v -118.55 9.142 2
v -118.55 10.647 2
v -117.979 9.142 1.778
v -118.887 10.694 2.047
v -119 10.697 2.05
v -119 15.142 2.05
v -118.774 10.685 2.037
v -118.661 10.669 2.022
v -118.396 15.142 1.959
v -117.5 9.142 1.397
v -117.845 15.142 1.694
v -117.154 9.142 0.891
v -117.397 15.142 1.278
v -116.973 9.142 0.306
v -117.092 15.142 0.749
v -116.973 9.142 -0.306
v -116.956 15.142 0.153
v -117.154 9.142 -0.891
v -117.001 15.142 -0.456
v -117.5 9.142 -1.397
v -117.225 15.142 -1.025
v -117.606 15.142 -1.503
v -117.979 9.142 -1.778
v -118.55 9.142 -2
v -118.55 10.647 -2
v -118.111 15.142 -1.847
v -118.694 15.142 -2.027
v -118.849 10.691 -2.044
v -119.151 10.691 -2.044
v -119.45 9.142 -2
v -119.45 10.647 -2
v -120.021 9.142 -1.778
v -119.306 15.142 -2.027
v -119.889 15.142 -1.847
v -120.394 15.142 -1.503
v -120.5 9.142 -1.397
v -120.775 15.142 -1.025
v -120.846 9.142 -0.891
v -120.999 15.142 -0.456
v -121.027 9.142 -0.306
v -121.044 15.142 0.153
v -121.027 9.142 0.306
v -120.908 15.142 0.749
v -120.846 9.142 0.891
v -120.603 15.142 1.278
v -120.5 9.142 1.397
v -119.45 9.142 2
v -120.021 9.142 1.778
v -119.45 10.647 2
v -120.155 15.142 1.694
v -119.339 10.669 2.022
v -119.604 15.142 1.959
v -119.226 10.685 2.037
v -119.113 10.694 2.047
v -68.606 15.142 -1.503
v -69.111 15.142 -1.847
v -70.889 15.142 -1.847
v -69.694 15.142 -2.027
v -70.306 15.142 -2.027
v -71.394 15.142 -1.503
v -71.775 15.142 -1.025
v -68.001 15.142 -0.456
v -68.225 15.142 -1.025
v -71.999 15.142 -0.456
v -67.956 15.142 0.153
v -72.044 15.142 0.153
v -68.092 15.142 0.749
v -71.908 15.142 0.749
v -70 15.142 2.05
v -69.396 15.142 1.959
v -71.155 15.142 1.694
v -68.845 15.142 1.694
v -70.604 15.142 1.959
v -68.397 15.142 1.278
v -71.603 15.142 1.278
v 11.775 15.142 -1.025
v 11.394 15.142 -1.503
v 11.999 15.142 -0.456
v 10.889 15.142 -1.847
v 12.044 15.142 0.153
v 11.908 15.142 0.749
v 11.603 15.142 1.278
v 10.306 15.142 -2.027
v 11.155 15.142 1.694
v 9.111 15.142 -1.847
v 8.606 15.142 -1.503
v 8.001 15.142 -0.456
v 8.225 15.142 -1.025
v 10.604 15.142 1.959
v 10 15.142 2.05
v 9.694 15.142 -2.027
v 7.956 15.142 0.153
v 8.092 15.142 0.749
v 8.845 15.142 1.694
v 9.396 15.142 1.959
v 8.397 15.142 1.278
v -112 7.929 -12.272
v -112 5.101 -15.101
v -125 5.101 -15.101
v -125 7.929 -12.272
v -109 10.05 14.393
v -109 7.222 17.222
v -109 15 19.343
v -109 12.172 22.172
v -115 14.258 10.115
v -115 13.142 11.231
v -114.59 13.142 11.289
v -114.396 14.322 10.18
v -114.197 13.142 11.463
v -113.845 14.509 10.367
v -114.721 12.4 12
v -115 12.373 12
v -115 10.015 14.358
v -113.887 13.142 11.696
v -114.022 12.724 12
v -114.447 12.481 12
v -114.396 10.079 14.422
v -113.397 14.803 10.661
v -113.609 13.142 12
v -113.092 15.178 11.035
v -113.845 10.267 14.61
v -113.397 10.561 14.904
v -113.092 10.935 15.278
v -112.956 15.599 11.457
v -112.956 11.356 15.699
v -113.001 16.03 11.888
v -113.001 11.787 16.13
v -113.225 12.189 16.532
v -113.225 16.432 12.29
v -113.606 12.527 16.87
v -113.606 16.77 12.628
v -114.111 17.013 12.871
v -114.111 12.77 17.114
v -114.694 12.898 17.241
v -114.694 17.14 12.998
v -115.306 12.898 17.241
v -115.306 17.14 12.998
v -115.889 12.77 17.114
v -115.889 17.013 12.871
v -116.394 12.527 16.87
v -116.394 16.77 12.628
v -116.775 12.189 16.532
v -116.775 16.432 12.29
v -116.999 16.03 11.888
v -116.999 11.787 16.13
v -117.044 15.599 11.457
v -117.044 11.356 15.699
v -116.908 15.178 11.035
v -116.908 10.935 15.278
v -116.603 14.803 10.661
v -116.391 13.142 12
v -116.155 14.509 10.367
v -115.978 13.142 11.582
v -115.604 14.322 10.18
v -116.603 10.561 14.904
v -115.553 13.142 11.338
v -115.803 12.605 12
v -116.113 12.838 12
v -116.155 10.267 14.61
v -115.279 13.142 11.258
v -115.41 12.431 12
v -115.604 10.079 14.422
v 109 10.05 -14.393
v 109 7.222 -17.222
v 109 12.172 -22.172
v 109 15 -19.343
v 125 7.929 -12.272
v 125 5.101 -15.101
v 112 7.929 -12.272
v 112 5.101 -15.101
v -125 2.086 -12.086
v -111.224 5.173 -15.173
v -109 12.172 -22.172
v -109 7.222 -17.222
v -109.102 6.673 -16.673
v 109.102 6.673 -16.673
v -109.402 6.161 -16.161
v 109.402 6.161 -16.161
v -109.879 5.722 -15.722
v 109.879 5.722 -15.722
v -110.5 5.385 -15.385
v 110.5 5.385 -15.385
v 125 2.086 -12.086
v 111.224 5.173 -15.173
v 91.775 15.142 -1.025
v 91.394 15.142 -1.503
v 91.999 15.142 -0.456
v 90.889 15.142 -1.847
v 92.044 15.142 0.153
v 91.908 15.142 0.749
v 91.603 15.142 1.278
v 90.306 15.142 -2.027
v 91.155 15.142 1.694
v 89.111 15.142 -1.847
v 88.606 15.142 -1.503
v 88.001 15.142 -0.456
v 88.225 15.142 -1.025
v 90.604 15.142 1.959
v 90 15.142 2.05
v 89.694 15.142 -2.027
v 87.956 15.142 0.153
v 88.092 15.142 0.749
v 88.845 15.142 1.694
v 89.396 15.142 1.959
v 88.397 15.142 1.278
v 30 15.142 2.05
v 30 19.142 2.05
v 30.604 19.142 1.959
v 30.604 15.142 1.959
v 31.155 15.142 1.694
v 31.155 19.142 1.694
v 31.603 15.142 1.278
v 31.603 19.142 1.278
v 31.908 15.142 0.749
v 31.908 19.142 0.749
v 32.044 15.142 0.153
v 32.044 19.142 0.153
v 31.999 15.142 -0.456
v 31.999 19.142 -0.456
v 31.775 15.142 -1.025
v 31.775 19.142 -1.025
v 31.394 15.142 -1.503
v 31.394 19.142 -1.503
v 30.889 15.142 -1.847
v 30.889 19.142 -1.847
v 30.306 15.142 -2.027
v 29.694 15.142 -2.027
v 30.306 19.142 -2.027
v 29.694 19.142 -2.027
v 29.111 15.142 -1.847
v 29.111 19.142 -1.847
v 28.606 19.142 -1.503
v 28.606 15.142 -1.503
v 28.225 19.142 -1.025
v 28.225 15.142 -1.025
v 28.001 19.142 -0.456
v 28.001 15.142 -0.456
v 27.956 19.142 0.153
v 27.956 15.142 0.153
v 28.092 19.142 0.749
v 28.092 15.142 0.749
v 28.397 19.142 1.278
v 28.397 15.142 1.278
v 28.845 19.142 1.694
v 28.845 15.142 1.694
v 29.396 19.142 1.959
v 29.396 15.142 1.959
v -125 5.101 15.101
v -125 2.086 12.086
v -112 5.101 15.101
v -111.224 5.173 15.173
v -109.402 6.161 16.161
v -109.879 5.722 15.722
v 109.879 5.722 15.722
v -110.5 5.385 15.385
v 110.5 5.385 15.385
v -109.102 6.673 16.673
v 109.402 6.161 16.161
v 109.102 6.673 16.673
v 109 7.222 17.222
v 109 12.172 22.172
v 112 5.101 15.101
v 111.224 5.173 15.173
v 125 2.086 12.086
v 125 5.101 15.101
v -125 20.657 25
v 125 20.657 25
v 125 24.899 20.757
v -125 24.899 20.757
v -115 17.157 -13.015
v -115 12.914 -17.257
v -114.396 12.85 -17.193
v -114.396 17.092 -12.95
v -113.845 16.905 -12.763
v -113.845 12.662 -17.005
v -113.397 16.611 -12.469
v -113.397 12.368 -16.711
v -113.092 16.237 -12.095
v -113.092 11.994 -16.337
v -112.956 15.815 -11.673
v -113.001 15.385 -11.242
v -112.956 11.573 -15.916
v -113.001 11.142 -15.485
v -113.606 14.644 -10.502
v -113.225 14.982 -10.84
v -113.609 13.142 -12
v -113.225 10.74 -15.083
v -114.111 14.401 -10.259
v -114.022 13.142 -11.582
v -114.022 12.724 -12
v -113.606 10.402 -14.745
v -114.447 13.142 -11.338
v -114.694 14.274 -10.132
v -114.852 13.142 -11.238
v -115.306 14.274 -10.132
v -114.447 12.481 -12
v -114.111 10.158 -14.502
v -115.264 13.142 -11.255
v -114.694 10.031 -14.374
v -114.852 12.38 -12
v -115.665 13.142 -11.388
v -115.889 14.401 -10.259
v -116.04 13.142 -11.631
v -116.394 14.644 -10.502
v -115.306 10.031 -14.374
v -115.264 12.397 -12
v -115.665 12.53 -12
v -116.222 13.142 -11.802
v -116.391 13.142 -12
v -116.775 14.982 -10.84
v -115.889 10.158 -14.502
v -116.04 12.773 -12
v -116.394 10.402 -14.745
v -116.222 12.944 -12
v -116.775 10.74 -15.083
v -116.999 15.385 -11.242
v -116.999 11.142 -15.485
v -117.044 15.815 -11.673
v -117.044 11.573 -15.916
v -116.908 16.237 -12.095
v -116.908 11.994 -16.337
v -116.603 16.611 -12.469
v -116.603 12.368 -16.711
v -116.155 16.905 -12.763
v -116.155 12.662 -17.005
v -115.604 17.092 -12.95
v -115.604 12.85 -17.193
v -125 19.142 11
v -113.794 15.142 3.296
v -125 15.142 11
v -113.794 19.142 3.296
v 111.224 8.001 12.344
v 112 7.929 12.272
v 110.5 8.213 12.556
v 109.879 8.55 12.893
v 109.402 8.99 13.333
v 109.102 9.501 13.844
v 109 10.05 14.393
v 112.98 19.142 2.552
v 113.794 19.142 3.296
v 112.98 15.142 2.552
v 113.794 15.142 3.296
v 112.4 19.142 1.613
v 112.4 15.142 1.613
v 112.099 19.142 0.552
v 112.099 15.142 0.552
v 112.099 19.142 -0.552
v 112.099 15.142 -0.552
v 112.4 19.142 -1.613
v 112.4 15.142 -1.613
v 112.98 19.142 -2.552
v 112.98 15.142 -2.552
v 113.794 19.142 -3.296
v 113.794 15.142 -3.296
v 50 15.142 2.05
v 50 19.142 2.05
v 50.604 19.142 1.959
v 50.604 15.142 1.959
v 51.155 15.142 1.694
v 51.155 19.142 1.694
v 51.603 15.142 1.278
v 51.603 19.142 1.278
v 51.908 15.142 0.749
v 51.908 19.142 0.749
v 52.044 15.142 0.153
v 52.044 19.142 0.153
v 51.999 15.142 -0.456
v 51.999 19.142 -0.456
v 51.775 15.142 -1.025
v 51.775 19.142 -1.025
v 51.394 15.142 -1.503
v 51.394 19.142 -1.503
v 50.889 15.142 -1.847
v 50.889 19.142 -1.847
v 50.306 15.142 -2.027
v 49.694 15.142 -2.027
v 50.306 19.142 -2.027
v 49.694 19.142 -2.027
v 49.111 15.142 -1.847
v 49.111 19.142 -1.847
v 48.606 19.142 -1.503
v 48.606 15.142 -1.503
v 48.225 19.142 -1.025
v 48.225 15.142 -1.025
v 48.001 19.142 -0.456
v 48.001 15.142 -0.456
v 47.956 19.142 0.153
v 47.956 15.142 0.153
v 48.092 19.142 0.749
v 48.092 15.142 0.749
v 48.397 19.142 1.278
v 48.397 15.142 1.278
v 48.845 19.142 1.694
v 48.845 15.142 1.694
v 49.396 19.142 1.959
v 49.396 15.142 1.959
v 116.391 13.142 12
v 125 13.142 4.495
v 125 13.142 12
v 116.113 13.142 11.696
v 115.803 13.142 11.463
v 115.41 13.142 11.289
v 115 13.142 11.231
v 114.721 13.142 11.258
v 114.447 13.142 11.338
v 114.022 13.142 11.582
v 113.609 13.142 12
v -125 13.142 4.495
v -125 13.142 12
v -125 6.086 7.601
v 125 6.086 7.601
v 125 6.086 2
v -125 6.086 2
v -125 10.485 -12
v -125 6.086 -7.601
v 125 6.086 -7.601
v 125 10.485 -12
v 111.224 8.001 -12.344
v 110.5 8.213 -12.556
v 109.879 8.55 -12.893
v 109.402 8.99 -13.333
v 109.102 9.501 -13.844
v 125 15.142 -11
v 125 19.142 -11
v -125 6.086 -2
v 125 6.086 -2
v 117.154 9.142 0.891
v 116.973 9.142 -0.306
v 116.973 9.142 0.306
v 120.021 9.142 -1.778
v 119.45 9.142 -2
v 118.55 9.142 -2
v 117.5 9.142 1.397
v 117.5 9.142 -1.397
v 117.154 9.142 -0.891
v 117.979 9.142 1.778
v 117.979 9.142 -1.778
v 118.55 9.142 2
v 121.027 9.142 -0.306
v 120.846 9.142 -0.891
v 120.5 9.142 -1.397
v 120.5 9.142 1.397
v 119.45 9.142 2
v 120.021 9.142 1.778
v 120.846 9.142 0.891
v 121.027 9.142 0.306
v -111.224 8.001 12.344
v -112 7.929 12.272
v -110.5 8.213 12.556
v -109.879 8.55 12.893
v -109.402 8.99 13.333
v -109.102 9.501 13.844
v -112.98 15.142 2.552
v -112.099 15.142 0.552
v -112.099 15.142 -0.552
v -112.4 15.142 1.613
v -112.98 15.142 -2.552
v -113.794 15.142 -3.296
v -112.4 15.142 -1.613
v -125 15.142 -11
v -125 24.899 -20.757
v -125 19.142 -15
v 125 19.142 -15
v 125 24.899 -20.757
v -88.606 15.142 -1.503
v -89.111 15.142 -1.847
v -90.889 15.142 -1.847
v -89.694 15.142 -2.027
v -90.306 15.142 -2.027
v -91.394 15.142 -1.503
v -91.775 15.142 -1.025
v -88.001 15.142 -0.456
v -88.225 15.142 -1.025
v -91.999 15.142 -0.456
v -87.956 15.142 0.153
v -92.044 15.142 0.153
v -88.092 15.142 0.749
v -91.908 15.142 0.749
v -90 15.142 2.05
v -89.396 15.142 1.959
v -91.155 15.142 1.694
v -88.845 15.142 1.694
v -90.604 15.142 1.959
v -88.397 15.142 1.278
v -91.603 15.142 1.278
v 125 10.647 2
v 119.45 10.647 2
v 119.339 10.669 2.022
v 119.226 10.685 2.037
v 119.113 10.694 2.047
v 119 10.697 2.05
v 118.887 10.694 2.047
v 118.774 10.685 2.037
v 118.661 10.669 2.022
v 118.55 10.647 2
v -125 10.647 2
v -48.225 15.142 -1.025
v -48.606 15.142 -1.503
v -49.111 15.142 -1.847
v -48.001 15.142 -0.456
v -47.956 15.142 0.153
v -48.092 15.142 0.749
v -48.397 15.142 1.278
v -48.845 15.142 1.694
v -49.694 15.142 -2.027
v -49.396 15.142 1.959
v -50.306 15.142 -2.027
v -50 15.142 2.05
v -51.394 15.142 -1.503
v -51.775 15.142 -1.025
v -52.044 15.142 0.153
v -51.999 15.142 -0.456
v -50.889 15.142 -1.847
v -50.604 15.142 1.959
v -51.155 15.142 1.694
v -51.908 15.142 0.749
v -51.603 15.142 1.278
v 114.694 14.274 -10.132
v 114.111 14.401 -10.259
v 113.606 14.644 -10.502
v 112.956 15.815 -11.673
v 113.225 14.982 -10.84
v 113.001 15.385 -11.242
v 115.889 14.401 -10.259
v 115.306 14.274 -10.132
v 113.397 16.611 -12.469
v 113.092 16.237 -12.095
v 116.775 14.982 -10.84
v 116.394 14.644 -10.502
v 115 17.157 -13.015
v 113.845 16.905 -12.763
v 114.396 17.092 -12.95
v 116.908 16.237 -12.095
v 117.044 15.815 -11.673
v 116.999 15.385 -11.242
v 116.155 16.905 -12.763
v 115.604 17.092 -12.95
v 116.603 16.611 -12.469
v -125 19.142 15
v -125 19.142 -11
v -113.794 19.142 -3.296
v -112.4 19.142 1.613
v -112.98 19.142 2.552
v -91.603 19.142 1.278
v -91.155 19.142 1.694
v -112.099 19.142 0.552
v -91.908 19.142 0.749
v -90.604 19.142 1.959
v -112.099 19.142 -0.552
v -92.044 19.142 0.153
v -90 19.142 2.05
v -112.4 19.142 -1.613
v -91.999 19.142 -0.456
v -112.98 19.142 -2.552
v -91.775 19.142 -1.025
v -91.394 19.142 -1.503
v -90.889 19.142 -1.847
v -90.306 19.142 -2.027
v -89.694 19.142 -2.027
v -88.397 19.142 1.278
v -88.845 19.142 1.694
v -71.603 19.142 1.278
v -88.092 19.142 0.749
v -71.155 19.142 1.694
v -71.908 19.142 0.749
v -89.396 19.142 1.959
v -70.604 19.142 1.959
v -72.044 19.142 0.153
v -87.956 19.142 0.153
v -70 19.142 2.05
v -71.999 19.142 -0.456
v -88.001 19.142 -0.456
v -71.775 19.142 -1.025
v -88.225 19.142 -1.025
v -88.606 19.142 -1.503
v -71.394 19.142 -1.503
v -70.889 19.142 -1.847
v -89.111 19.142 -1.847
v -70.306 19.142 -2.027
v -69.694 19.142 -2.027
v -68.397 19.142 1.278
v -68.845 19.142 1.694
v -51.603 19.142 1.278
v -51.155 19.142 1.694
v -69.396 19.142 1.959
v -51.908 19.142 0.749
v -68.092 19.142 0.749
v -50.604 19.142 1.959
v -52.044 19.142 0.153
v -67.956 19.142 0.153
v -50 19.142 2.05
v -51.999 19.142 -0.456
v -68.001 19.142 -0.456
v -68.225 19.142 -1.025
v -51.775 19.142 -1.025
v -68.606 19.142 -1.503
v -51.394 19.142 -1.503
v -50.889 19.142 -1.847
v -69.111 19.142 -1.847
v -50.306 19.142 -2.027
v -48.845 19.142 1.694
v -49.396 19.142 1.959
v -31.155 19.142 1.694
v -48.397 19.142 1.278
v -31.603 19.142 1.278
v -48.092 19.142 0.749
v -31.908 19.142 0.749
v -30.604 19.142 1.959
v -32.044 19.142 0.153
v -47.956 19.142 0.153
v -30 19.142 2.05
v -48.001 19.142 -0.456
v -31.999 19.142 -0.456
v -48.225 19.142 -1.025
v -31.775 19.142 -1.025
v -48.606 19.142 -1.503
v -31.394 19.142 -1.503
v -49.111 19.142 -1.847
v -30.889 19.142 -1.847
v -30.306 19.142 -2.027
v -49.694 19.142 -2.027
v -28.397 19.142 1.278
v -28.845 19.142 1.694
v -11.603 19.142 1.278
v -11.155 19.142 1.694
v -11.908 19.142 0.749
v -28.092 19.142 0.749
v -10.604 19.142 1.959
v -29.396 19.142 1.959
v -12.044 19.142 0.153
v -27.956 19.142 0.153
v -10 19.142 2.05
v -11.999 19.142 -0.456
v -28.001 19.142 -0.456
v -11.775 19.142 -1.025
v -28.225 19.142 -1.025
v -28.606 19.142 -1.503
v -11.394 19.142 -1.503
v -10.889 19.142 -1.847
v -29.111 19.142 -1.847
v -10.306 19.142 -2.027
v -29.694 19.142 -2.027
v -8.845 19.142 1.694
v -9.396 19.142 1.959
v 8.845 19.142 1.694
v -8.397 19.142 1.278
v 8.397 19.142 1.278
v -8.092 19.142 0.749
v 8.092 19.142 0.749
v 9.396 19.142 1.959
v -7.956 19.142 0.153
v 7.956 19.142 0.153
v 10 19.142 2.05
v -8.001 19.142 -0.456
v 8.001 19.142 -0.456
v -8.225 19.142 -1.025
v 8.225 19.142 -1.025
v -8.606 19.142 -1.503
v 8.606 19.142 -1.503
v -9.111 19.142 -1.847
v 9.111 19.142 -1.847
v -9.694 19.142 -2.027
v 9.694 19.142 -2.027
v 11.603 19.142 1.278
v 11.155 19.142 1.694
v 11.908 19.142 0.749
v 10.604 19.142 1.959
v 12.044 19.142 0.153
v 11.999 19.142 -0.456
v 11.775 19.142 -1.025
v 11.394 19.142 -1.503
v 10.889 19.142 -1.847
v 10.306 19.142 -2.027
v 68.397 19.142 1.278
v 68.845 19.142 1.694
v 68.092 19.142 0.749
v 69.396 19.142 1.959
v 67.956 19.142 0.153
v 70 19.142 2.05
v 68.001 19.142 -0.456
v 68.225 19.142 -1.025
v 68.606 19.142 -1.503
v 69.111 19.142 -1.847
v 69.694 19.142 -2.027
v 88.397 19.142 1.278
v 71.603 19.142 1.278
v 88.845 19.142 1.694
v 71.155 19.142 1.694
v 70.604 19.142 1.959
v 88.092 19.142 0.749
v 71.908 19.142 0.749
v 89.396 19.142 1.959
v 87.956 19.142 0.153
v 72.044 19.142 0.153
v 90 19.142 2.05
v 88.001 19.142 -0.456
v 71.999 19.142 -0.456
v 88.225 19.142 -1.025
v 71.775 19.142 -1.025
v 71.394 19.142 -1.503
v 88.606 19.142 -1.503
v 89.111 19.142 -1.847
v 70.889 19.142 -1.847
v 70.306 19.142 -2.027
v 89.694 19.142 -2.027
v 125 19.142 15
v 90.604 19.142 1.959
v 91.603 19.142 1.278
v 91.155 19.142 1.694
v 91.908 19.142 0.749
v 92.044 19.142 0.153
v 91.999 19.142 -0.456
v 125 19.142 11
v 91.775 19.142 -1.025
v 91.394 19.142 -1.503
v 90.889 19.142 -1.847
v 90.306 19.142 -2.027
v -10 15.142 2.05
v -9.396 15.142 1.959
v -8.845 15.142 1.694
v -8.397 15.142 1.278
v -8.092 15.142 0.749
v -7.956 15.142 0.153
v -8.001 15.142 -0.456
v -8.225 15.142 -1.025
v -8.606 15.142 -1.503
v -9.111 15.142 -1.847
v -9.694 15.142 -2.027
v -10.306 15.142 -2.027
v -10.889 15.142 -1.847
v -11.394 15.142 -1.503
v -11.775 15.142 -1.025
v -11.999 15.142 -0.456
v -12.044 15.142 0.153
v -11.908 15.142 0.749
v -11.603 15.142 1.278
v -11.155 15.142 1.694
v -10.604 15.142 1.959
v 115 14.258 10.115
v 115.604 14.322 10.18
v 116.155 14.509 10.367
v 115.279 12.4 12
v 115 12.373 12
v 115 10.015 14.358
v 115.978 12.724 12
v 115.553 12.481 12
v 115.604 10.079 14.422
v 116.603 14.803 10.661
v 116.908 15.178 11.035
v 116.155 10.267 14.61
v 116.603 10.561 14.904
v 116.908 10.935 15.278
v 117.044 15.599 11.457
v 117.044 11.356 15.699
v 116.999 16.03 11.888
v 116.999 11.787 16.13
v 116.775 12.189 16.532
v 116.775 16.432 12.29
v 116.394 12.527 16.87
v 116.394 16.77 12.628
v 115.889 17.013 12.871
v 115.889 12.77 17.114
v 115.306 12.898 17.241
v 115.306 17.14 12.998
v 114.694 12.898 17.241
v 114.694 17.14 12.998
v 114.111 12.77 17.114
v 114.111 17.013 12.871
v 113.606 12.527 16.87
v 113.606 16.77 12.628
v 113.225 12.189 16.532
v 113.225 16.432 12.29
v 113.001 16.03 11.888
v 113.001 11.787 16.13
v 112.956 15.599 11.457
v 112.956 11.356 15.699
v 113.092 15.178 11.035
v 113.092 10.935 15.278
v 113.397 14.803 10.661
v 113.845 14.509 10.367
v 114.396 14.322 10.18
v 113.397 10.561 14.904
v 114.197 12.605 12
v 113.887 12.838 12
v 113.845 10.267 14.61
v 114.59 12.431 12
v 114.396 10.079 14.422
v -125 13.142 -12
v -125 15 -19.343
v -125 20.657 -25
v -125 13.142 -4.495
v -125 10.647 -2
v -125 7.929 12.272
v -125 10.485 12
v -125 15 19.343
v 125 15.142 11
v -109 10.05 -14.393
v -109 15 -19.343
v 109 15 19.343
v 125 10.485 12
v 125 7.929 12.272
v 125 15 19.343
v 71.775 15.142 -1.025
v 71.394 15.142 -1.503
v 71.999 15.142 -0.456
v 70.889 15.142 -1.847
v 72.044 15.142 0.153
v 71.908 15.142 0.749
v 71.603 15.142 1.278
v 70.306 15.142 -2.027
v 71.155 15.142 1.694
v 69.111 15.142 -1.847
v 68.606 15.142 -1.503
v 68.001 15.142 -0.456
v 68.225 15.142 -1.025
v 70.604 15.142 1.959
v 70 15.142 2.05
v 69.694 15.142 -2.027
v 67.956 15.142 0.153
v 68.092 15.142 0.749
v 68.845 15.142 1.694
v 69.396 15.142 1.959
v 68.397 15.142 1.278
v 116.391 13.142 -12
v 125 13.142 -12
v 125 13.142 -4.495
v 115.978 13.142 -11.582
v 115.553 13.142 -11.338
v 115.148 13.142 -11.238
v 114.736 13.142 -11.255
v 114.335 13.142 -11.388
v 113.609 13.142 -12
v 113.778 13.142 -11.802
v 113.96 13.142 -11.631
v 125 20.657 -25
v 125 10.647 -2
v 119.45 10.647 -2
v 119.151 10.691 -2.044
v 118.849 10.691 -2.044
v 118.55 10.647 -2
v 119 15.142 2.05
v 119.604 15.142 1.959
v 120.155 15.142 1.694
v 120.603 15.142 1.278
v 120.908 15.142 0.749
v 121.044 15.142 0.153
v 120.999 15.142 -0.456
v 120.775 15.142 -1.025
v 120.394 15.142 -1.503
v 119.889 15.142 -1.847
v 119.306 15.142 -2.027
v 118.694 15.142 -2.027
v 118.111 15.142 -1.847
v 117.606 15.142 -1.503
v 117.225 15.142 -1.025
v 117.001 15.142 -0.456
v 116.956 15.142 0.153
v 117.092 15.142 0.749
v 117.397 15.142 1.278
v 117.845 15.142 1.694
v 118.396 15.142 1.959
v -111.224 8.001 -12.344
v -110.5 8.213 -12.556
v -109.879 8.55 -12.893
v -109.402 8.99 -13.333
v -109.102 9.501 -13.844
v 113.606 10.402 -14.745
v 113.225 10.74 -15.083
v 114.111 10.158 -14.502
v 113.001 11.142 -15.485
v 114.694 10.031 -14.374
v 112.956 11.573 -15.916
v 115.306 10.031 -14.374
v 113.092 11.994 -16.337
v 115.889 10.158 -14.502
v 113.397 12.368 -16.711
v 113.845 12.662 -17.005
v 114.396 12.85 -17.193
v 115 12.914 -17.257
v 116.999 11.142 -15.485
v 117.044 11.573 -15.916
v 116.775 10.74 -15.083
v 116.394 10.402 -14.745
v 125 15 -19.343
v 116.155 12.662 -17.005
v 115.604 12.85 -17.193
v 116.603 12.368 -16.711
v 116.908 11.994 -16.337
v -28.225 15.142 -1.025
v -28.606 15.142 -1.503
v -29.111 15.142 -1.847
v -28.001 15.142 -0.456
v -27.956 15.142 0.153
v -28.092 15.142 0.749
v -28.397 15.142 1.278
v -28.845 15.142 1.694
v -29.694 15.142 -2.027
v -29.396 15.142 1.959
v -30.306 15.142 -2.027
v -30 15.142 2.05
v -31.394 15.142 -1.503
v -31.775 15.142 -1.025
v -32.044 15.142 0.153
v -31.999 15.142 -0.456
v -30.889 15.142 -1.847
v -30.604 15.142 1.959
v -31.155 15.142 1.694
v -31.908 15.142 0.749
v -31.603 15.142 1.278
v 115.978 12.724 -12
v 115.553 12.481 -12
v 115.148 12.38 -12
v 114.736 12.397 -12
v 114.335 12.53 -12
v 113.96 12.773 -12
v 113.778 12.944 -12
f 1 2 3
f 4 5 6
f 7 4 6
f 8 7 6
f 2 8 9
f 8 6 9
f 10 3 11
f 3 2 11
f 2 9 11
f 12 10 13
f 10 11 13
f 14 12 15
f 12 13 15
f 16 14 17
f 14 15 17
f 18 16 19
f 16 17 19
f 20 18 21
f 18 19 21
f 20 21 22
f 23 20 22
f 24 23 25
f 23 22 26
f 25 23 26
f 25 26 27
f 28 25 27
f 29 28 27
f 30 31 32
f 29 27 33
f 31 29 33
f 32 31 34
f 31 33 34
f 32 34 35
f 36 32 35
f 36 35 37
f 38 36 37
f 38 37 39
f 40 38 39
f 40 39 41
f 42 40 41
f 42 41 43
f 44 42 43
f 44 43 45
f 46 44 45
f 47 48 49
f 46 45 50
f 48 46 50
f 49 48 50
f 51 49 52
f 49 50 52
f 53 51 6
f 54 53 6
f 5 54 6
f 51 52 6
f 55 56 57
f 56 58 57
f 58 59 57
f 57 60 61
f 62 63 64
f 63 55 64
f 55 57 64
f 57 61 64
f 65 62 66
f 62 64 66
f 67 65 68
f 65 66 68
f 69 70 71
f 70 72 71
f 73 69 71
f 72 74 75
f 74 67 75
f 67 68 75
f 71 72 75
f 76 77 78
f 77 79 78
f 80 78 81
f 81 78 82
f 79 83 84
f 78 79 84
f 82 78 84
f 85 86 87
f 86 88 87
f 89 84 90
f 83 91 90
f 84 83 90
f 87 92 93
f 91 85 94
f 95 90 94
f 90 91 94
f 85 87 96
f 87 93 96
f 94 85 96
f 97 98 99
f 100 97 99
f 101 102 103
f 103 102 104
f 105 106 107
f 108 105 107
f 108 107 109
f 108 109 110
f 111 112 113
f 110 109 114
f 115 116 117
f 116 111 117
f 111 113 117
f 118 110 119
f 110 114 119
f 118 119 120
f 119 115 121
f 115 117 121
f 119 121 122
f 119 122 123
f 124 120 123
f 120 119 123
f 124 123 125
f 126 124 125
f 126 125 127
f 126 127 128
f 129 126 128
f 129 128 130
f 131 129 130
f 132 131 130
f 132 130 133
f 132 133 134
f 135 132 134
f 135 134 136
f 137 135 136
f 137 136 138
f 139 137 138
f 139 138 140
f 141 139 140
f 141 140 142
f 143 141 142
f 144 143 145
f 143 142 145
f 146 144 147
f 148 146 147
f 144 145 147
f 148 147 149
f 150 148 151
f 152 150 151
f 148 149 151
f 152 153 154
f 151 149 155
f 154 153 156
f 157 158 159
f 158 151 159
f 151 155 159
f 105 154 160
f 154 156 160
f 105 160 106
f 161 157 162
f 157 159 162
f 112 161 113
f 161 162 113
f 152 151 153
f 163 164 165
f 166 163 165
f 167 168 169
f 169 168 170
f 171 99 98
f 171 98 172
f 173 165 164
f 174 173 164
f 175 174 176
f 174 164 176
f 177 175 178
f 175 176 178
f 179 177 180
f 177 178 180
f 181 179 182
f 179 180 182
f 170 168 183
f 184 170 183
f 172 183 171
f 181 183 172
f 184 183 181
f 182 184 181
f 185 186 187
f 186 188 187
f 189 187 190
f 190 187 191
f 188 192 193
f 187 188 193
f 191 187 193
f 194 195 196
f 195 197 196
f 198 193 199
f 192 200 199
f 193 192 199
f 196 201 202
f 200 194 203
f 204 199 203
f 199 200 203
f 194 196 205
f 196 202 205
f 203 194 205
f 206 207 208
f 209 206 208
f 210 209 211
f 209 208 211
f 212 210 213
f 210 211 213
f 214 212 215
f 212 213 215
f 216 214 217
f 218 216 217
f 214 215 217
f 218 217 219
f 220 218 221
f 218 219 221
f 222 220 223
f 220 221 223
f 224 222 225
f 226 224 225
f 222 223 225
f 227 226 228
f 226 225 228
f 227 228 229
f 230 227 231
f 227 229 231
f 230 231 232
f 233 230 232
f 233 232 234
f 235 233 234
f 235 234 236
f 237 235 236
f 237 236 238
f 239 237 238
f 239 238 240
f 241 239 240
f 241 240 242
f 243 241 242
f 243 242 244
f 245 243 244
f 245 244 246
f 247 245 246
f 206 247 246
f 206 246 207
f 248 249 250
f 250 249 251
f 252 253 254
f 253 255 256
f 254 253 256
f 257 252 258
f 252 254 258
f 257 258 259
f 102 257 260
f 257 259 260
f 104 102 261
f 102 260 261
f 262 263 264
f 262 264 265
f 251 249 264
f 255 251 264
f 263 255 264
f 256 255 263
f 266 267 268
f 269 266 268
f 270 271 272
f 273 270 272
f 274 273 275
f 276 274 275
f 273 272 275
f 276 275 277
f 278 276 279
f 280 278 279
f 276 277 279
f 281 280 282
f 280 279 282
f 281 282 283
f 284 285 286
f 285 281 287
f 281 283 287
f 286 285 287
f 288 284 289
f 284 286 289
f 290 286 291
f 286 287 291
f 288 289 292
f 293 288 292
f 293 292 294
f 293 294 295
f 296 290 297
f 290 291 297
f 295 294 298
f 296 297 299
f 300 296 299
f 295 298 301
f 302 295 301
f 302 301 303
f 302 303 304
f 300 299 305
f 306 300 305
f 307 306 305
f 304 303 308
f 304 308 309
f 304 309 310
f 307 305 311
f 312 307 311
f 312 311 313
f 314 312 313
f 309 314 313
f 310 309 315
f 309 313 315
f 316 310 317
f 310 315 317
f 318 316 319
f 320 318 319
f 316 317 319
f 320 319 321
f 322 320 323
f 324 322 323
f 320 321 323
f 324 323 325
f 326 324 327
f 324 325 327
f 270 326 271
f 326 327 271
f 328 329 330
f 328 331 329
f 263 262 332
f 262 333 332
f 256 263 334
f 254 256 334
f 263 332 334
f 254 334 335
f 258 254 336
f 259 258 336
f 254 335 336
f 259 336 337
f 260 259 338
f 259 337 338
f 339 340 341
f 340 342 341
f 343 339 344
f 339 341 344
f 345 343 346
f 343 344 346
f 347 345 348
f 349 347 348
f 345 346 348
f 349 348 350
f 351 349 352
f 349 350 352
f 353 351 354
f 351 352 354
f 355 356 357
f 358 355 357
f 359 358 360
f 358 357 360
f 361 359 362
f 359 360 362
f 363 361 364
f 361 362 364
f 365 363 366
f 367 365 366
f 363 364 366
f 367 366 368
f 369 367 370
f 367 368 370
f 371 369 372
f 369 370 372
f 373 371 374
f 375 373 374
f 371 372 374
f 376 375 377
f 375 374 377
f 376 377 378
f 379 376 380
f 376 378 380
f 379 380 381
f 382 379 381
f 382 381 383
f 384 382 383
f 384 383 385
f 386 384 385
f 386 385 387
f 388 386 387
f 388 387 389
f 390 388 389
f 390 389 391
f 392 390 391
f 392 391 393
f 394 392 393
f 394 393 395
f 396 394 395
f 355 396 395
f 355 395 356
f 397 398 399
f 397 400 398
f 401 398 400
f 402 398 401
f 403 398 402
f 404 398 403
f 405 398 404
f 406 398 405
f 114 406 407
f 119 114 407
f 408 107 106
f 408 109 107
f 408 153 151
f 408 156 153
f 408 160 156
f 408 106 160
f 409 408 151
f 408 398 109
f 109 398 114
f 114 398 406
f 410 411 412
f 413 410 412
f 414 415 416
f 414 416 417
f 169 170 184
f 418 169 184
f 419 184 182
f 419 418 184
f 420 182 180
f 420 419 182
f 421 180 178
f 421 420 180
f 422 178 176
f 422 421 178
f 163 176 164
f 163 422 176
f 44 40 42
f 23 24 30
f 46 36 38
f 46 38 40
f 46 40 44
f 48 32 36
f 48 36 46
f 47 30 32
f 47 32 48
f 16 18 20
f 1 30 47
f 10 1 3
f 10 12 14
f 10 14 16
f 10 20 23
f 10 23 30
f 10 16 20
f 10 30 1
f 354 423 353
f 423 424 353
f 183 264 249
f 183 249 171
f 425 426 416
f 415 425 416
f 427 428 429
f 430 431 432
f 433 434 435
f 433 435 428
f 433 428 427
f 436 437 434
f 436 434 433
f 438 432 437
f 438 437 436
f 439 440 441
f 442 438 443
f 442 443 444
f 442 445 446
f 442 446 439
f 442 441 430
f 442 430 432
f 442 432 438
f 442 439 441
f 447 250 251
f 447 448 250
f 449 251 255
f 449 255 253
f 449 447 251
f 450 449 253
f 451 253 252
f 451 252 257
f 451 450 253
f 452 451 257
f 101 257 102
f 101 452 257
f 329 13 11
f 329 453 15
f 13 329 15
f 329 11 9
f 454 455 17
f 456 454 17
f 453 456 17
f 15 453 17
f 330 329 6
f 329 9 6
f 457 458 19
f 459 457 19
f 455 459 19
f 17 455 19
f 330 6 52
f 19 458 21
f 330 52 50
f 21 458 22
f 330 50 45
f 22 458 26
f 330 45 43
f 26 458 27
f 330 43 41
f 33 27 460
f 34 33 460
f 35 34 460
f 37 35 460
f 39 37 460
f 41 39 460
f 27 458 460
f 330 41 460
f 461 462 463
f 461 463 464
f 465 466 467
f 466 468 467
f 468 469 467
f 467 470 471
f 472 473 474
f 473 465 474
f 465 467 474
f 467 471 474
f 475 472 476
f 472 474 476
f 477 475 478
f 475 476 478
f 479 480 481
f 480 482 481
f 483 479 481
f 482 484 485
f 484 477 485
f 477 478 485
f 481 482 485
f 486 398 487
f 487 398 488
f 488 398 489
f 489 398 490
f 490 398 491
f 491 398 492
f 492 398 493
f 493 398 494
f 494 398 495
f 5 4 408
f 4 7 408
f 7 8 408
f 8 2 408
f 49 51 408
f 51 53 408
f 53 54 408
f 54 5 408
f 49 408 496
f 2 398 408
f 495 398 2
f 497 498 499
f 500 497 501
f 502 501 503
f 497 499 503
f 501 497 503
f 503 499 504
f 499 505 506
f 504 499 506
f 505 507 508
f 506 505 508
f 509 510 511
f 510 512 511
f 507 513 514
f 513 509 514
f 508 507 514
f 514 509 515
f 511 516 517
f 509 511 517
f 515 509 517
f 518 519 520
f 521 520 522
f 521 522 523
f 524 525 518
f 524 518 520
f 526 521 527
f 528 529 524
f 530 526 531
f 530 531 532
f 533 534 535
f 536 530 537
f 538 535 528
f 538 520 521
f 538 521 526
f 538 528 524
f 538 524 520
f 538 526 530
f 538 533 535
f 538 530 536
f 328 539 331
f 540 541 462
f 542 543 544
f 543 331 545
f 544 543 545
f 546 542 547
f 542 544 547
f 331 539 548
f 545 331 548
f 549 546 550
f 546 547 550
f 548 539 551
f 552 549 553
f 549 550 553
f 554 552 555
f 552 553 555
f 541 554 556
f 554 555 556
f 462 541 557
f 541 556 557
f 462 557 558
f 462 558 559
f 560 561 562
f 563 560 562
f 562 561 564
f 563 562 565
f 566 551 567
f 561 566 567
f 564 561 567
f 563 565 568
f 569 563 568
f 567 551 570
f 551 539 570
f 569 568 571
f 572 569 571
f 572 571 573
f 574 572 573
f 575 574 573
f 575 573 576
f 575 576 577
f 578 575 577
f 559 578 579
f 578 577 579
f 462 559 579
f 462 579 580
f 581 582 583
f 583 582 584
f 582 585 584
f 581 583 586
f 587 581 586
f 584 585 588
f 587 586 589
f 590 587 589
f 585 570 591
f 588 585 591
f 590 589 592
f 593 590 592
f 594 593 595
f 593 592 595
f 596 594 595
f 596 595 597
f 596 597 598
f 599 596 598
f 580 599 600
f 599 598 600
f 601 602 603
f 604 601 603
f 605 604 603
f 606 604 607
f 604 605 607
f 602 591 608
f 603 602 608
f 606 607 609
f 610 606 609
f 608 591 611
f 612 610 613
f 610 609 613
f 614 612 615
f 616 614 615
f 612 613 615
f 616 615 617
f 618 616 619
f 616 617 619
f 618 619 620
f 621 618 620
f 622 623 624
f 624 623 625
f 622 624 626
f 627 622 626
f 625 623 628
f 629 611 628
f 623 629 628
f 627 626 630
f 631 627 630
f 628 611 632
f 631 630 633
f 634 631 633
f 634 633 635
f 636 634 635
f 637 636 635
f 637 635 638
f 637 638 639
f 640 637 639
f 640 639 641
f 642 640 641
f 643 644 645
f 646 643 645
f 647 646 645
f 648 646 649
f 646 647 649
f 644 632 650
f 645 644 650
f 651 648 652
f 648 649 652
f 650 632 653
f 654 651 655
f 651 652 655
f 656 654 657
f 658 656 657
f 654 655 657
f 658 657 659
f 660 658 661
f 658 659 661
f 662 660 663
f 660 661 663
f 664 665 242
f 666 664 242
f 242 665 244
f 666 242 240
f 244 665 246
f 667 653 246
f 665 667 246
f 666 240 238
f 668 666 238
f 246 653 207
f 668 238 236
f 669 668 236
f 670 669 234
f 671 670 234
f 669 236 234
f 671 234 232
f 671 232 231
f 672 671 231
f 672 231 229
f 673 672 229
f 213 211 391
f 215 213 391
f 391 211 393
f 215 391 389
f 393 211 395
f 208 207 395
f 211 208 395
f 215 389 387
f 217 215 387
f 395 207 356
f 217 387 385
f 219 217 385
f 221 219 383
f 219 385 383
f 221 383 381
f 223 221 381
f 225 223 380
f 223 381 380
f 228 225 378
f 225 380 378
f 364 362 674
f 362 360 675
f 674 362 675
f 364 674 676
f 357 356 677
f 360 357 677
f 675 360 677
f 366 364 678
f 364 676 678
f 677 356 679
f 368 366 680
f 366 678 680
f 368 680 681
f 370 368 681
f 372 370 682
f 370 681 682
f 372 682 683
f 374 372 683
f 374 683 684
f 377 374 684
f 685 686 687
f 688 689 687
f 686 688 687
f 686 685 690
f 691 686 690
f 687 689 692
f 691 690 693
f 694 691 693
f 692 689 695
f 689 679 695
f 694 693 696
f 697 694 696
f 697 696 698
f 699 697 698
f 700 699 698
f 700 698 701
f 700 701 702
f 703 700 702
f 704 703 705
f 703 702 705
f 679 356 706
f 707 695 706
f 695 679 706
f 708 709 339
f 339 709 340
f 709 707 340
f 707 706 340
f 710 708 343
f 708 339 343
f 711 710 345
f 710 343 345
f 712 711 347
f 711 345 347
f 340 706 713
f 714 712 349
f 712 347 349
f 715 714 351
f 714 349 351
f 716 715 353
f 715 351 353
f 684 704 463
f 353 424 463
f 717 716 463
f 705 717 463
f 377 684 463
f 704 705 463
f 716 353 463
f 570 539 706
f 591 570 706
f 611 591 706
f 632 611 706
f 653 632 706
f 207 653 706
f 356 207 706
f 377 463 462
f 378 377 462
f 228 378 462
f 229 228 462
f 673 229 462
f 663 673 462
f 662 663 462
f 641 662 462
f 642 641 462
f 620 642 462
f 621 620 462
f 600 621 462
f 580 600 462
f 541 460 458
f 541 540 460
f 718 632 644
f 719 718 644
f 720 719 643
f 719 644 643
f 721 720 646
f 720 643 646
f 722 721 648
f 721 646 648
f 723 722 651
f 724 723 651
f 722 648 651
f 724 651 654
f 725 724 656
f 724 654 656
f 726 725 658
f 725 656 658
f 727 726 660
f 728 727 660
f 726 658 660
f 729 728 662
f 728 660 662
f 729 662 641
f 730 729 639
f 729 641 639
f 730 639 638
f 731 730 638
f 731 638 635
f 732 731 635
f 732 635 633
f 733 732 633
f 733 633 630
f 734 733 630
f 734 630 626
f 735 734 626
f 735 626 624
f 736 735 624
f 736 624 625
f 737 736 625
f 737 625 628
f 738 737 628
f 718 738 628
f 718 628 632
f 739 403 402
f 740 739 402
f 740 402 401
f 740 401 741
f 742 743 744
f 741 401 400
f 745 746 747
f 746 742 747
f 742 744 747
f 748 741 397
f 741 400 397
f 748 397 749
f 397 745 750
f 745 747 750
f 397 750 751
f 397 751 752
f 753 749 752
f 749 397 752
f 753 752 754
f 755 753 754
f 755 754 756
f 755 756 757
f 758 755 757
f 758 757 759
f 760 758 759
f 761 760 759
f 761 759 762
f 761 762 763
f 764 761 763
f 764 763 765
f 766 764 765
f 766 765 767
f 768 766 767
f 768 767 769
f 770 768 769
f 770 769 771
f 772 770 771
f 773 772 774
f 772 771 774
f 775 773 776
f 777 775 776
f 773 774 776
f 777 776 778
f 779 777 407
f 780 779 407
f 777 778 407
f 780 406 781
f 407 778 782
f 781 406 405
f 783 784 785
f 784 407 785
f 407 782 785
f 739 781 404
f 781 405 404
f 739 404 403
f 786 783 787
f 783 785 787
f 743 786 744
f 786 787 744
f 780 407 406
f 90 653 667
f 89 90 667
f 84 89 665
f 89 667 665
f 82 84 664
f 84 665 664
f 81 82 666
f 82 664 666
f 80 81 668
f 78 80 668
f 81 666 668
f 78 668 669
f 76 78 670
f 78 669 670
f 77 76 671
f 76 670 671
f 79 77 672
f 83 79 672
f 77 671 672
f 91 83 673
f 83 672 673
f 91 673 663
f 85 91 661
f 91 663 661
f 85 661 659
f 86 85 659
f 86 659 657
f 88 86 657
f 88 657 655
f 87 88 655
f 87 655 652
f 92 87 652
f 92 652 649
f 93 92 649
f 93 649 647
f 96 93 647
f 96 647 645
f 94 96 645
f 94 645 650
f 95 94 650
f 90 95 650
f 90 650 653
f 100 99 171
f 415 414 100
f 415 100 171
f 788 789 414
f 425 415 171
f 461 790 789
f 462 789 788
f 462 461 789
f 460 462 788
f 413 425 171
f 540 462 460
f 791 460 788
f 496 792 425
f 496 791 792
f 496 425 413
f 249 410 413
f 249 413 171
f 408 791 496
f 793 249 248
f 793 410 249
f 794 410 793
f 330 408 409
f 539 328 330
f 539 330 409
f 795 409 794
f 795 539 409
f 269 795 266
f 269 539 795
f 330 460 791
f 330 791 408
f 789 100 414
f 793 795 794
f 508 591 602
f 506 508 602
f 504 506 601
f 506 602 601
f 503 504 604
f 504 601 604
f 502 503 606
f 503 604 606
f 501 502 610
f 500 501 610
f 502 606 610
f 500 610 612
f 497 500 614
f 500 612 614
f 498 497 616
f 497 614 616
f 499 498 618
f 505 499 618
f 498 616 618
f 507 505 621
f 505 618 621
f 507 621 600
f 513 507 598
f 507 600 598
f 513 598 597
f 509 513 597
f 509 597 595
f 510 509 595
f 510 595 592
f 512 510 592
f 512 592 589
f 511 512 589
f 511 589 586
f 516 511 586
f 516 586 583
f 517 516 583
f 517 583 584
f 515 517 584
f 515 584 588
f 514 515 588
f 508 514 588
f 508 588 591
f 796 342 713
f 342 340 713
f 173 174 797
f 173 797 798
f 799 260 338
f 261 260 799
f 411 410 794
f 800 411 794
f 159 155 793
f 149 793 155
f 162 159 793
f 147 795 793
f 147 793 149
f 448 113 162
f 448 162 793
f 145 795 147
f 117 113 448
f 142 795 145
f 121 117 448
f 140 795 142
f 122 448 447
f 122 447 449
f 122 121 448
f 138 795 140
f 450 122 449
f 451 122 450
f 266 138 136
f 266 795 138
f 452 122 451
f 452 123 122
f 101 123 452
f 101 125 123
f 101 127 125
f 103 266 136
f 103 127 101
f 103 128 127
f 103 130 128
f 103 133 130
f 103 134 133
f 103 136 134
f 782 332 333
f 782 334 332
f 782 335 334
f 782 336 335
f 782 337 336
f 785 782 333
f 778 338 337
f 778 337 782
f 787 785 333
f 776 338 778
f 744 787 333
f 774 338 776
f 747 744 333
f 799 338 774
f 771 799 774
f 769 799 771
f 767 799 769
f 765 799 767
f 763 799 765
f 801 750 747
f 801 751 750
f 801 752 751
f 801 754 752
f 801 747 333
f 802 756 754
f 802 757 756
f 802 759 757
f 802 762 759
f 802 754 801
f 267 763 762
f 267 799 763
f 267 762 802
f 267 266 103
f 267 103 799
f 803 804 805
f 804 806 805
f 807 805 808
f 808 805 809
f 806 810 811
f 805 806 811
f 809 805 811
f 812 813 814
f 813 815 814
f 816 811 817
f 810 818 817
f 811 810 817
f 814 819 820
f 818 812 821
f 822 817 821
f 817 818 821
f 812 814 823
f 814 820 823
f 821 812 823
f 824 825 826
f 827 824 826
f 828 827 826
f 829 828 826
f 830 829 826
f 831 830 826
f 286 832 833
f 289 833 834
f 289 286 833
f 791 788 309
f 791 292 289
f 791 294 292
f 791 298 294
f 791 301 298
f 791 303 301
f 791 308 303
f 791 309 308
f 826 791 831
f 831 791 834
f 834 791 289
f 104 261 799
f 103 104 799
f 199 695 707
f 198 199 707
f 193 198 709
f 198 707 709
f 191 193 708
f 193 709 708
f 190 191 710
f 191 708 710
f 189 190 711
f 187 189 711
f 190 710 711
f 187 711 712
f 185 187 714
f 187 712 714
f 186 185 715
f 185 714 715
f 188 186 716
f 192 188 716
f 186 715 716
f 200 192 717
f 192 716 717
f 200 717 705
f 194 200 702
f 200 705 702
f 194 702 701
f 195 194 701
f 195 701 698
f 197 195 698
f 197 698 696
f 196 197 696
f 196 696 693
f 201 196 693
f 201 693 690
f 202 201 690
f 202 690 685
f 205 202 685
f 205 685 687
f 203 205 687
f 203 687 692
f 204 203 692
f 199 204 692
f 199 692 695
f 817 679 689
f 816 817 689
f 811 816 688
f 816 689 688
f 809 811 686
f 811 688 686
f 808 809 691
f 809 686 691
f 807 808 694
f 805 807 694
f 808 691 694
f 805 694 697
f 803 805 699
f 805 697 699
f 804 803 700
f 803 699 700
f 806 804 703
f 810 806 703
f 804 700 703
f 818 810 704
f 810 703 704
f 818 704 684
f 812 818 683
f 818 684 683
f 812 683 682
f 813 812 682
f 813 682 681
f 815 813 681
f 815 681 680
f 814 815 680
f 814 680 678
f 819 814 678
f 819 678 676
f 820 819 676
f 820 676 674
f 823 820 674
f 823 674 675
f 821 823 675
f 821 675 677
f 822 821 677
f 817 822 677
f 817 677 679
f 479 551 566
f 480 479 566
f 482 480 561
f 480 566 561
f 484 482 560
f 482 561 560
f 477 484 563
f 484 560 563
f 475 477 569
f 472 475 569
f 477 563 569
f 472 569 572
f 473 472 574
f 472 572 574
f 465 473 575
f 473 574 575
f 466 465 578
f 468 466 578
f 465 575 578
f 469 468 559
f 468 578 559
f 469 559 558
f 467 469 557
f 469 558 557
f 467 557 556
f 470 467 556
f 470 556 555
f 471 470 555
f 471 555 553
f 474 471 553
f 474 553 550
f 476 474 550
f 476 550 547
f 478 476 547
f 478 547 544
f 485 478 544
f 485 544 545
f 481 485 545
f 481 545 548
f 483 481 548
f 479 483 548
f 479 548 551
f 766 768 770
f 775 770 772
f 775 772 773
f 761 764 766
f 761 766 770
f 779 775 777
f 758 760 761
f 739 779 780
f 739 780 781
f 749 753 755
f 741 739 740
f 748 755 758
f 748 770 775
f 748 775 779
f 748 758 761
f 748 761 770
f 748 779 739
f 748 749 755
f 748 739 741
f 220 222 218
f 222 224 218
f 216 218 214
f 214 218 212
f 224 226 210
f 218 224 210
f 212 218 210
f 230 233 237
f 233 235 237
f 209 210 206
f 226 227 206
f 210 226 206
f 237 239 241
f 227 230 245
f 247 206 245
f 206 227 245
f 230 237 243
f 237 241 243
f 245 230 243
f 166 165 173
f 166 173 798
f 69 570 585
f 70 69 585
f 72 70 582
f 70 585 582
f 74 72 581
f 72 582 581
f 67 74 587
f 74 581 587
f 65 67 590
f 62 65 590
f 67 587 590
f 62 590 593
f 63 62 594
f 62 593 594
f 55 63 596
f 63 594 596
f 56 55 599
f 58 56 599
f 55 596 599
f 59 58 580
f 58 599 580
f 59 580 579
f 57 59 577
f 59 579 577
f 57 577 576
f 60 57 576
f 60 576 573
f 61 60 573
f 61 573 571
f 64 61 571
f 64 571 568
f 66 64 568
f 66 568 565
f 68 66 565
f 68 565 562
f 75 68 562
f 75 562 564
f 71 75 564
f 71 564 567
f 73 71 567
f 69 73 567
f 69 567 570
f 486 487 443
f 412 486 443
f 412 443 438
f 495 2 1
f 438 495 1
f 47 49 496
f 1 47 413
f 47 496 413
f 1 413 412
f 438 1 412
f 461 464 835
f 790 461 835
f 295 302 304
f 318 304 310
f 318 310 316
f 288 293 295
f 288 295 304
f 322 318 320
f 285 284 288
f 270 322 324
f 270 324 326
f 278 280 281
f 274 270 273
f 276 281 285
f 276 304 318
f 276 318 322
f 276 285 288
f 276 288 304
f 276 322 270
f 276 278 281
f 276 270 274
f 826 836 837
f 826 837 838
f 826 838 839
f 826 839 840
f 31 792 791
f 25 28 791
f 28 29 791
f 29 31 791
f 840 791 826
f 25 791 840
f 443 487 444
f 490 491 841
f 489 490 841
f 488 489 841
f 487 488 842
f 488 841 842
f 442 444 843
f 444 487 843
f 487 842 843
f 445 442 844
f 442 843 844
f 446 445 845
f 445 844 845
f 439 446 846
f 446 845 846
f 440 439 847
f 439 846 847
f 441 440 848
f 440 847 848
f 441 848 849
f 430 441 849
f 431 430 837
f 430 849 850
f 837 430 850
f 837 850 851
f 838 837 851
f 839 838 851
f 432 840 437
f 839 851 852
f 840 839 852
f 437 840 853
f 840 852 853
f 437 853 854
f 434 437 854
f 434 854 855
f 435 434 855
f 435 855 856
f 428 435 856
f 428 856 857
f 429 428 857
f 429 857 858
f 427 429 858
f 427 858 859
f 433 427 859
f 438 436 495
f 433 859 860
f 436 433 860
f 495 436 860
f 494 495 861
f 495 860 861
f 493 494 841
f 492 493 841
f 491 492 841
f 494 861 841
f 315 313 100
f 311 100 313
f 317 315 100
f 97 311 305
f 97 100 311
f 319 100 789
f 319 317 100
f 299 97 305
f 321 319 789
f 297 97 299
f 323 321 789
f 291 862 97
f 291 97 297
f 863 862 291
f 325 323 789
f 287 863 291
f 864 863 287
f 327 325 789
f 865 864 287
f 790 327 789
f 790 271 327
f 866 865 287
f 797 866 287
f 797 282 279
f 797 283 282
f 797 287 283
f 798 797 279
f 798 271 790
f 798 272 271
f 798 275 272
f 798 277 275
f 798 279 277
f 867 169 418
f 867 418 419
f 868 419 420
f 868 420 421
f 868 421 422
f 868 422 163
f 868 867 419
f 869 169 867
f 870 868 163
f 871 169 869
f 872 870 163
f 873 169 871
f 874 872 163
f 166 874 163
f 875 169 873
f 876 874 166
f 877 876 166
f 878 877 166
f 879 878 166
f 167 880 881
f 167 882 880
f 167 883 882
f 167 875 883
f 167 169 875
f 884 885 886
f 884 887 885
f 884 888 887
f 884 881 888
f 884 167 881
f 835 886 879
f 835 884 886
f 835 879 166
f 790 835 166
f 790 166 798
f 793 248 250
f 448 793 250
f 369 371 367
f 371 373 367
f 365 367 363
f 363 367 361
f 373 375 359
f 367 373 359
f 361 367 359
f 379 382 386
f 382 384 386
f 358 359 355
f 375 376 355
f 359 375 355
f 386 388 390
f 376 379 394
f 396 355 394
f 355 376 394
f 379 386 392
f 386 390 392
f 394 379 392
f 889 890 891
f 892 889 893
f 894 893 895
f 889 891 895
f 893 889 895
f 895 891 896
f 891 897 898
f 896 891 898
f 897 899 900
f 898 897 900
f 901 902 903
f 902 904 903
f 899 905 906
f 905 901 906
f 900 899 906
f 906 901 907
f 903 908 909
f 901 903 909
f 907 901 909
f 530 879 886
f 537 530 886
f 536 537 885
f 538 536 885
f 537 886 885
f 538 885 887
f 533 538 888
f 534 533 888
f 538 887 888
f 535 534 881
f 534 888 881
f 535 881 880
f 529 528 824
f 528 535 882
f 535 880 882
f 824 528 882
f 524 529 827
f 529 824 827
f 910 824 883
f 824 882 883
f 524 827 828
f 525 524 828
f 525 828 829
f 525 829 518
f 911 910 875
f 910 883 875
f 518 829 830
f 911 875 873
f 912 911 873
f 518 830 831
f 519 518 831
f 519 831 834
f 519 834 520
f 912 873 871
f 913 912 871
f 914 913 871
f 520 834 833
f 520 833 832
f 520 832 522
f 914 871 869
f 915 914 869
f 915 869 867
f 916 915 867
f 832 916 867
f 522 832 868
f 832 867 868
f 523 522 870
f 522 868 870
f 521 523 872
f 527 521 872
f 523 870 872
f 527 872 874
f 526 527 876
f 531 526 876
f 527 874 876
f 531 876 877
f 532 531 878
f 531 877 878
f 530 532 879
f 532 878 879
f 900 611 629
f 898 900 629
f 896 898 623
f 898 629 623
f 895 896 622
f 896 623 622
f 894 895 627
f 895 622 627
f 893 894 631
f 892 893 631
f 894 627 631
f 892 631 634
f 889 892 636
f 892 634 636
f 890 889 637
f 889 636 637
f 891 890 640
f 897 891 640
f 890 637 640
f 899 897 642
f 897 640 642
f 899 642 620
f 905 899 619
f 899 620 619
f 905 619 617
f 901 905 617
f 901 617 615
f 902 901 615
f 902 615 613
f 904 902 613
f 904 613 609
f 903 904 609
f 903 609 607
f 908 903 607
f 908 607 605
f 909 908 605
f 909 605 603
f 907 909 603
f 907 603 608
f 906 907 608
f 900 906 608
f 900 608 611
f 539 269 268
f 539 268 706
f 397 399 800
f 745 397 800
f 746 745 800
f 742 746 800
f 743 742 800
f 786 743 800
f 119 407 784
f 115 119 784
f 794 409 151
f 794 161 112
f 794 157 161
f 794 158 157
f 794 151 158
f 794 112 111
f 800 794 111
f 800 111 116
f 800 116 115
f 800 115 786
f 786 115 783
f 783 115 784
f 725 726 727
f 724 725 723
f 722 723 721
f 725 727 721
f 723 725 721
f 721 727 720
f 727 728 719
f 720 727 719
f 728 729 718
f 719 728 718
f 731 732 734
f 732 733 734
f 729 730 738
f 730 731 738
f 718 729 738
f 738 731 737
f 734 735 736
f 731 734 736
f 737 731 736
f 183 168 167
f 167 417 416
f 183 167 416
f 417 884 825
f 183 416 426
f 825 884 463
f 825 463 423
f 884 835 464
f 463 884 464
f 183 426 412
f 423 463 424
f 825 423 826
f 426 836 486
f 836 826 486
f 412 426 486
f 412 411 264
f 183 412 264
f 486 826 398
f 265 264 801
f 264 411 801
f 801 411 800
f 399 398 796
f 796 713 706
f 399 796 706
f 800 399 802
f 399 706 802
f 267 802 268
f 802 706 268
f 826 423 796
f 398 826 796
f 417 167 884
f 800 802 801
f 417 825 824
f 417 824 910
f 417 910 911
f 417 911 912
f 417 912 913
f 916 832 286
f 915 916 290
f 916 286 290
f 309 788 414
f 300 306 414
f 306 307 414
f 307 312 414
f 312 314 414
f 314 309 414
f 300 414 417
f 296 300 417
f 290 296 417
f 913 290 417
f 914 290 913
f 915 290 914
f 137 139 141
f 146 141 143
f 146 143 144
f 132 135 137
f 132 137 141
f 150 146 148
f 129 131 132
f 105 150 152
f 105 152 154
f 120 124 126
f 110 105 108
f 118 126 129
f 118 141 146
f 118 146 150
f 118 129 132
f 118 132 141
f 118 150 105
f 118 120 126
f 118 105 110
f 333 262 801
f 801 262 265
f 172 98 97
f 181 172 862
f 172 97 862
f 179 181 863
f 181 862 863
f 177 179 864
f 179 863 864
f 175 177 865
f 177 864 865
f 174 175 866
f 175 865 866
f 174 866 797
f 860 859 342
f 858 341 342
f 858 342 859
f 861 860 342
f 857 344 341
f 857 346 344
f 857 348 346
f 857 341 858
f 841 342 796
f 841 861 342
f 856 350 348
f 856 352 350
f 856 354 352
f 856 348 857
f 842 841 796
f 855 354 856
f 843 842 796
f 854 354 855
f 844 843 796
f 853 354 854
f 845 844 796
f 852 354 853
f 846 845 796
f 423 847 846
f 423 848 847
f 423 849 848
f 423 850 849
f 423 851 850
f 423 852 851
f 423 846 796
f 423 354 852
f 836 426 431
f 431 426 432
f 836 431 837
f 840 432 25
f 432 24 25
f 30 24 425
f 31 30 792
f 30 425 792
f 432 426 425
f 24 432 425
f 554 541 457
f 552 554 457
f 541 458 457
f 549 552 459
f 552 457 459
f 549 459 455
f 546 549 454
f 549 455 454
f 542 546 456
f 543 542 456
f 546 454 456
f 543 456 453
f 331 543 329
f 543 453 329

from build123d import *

# Parameters (mm, degrees)
BOSS_EXTRUDE1_DEPTH      = 125
BOSS_EXTRUDE1_DEPTH_BACK = 125
SKETCH1_W                = 50
SKETCH1_H                = 30
CUT_EXTRUDE1_DEPTH       = 254.031618578
CUT_EXTRUDE2_DEPTH       = 254.031618578
CUT_EXTRUDE3_DEPTH       = 254.031618578
SKETCH6_R                = 2.05
CUT_EXTRUDE4_DEPTH       = 6
CUT_EXTRUDE5_DEPTH       = 253.477691783
BOSS_EXTRUDE2_DEPTH      = 250
BOSS_EXTRUDE3_DEPTH      = 250
CUT_EXTRUDE6_DEPTH       = 253.477691783
SKETCH11_W               = 16
SKETCH11_H               = 10
CUT_EXTRUDE7_DEPTH       = 4
SKETCH12_W               = 16
SKETCH12_H               = 18
CUT_EXTRUDE11_DEPTH      = 4
BOSS_EXTRUDE4_DEPTH      = 250
CUT_EXTRUDE12_DEPTH      = 4
SKETCH15_W               = 30
SKETCH15_H               = 2
BOSS_EXTRUDE5_DEPTH      = 250
FILLET1_R                = 4
FILLET2_R                = 3
SKETCH16_R               = 2.05
CUT_EXTRUDE13_DEPTH      = 6
SKETCH17_R               = 2.05
CUT_EXTRUDE14_DEPTH      = 6
SKETCH18_R               = 2.05
CUT_EXTRUDE15_DEPTH      = 6


with BuildPart() as part:
    # Sketch1 → Boss-Extrude1 (new, two sides: drawn at the far end of the back side and taken through both)
    with BuildSketch(Plane(origin=(0, 0, 0), x_dir=(0, 0, -1), z_dir=(1, 0, 0)).offset(-BOSS_EXTRUDE1_DEPTH_BACK)):
        with Locations((0, 15)):
            Rectangle(SKETCH1_W, SKETCH1_H)
    extrude(amount=BOSS_EXTRUDE1_DEPTH + BOSS_EXTRUDE1_DEPTH_BACK)

    # Sketch2 → Cut-Extrude1 (cut, through all)
    with BuildSketch(Plane(origin=(125, 0, 0), x_dir=(0, 0, -1), z_dir=(1, 0, 0))):
        Polygon((-10, 0), (-25, 15), (-25, 0), align=None)
        Polygon((25, 15), (10, 0), (25, 0), align=None)
    extrude(amount=-CUT_EXTRUDE1_DEPTH, mode=Mode.SUBTRACT)

    # Sketch4 → Cut-Extrude2 (cut, through all)
    with BuildSketch(Plane(origin=(125, 0, 0), x_dir=(0, 0, -1), z_dir=(1, 0, 0))):
        Polygon((-22.171572875, 12.171572875), (-19.343145751, 15), (-25, 20.656854249), (-25, 15), align=None)
        Polygon((22.171572875, 12.171572875), (19.343145751, 15), (25, 20.656854249), (25, 15), align=None)
    extrude(amount=-CUT_EXTRUDE2_DEPTH, mode=Mode.SUBTRACT)

    # Sketch5 → Cut-Extrude3 (cut, through all)
    with BuildSketch(Plane(origin=(125, 0, 0), x_dir=(0, 0, -1), z_dir=(1, 0, 0))):
        Polygon((-25, 20.656854249), (-20.757359313, 24.899494937), (-15, 19.142135624), (15, 19.142135624), (20.757359313, 24.899494937), (25, 20.656854249), (25, 30), (-25, 30), align=None)
    extrude(amount=-CUT_EXTRUDE3_DEPTH, mode=Mode.SUBTRACT)

    # Sketch6 → Cut-Extrude4 (cut)
    with BuildSketch(Plane(origin=(0, 19.142135624, 0), x_dir=(1, 0, 0), z_dir=(0, 1, 0))):
        with Locations(Location((-10, 0, 0), (0, 0, 270))):
            Circle(SKETCH6_R)
        with Locations(Location((10, 0, 0), (0, 0, 270))):
            Circle(SKETCH6_R)
        with Locations(Location((30, 0, 0), (0, 0, 270))):
            Circle(SKETCH6_R)
        with Locations(Location((50, 0, 0), (0, 0, 270))):
            Circle(SKETCH6_R)
        with Locations(Location((70, 0, 0), (0, 0, 270))):
            Circle(SKETCH6_R)
        with Locations(Location((90, 0, 0), (0, 0, 270))):
            Circle(SKETCH6_R)
        with Locations(Location((-30, 0, 0), (0, 0, 270))):
            Circle(SKETCH6_R)
        with Locations(Location((-50, 0, 0), (0, 0, 270))):
            Circle(SKETCH6_R)
        with Locations(Location((-70, 0, 0), (0, 0, 270))):
            Circle(SKETCH6_R)
        with Locations(Location((-90, 0, 0), (0, 0, 270))):
            Circle(SKETCH6_R)
    extrude(amount=-CUT_EXTRUDE4_DEPTH, mode=Mode.SUBTRACT)

    # Sketch7 → Cut-Extrude5 (cut, through all)
    with BuildSketch(Plane.ZY.offset(125)):
        Polygon((-8.343145751, 4), (-2, 4), (-2, 10.647041832), (-6.495093791, 15.142135624), (-10.495093791, 15.142135624), (-14.990187583, 10.647041832), align=None)
        Polygon((8.343145751, 4), (14.990187583, 10.647041832), (10.495093791, 15.142135624), (6.495093791, 15.142135624), (2, 10.647041832), (2, 4), align=None)
    extrude(amount=-CUT_EXTRUDE5_DEPTH, mode=Mode.SUBTRACT)

    # Sketch8 → Boss-Extrude2 (add, through all)
    with BuildSketch(Plane.ZY.offset(125)):
        Polygon((-12, 13.637229415), (-12, 7.656854249), (-14.990187583, 10.647041832), align=None)
        Polygon((12, 13.637229415), (12, 7.656854249), (14.990187583, 10.647041832), align=None)
    extrude(amount=-BOSS_EXTRUDE2_DEPTH)

    # Sketch9 → Boss-Extrude3 (add, through all)
    with BuildSketch(Plane(origin=(125, 0, 0), x_dir=(0, 0, -1), z_dir=(1, 0, 0))):
        Polygon((-16.085786438, 6.085786438), (16.085786438, 6.085786438), (10, 0), (-10, 0), align=None)
    extrude(amount=-BOSS_EXTRUDE3_DEPTH)

    # Sketch10 → Cut-Extrude6 (cut, through all)
    with BuildSketch(Plane(origin=(125, 0, 0), x_dir=(0, 0, -1), z_dir=(1, 0, 0))):
        Polygon((-12.085786438, 2.085786438), (12.085786438, 2.085786438), (10, 0), (-10, 0), align=None)
    extrude(amount=-CUT_EXTRUDE6_DEPTH, mode=Mode.SUBTRACT)

    # Sketch11 → Cut-Extrude7 (cut)
    with BuildSketch(Plane(origin=(0, -5, 5), x_dir=(1, 0, 0), z_dir=(0, -0.7071067811865477, 0.7071067811865475))):
        with Locations((117, 19.284271247)):
            Rectangle(SKETCH11_W, SKETCH11_H)
        with Locations((-117, 19.284271247)):
            Rectangle(SKETCH11_W, SKETCH11_H)
    extrude(amount=-CUT_EXTRUDE7_DEPTH, mode=Mode.SUBTRACT)

    # Sketch12 → Cut-Extrude11 (cut)
    with BuildSketch(Plane(origin=(0, -5, -5), x_dir=(-1, 0, 0), z_dir=(0, -0.7071067811865477, -0.7071067811865475))):
        with Locations((-117, 23.284271247)):
            Rectangle(SKETCH12_W, SKETCH12_H)
        with Locations((117, 23.284271247)):
            Rectangle(SKETCH12_W, SKETCH12_H)
    extrude(amount=-CUT_EXTRUDE11_DEPTH, mode=Mode.SUBTRACT)

    # Sketch13 → Boss-Extrude4 (add, through all)
    with BuildSketch(Plane(origin=(125, 0, 0), x_dir=(0, 0, -1), z_dir=(1, 0, 0))):
        Polygon((7.600505063, 6.085786438), (13.514718626, 12), (14.928932188, 10.585786438), (10.428932188, 6.085786438), align=None)
        Polygon((-7.600505063, 6.085786438), (-13.514718626, 12), (-14.928932188, 10.585786438), (-10.428932188, 6.085786438), align=None)
    extrude(amount=-BOSS_EXTRUDE4_DEPTH)

    # Sketch14 → Cut-Extrude12 (cut)
    with BuildSketch(Plane(origin=(0, 19.142135624, 0), x_dir=(1, 0, 0), z_dir=(0, 1, 0))):
        Polygon((125, 11), (109, 0), (125, -11), align=None)
        Polygon((-125, 11), (-109, 0), (-125, -11), align=None)
    extrude(amount=-CUT_EXTRUDE12_DEPTH, mode=Mode.SUBTRACT)

    # Sketch15 → Boss-Extrude5 (add, through all)
    with BuildSketch(Plane.ZY.offset(125)):
        with Locations((0, 14.142135624)):
            Rectangle(SKETCH15_W, SKETCH15_H)
    extrude(amount=-BOSS_EXTRUDE5_DEPTH)

    # Fillet1
    fillet1_edges = [part.edges().sort_by_distance(p)[0] for p in [
        (109, 17.142135624, 0),
        (-109, 17.142135624, 0),
    ]]
    fillet(fillet1_edges, radius=FILLET1_R)

    # Fillet2
    fillet2_edges = [part.edges().sort_by_distance(p)[0] for p in [
        (109, 6.514718626, 13.686291501),
        (-109, 6.514718626, 13.686291501),
        (109, 6.514718626, -13.686291501),
        (-109, 6.514718626, -13.686291501),
    ]]
    fillet(fillet2_edges, radius=FILLET2_R)

    # Sketch16 → Cut-Extrude13 (cut)
    with BuildSketch(Plane(origin=(0, 15.142135624, 0), x_dir=(1, 0, 0), z_dir=(0, 1, 0))):
        with Locations(Location((119, 0, 0), (0, 0, 270))):
            Circle(SKETCH16_R)
        with Locations(Location((-119, 0, 0), (0, 0, 270))):
            Circle(SKETCH16_R)
    extrude(amount=-CUT_EXTRUDE13_DEPTH, mode=Mode.SUBTRACT)

    # Sketch17 → Cut-Extrude14 (cut)
    with BuildSketch(Plane(origin=(0, -2.171572875, -2.171572875), x_dir=(-1, 0, 0), z_dir=(0, -0.7071067811865469, -0.7071067811865481))):
        with Locations(Location((-115, 19.284271247, 0), (0, 0, 90))):
            Circle(SKETCH17_R)
        with Locations(Location((115, 19.284271247, 0), (0, 0, 90))):
            Circle(SKETCH17_R)
    extrude(amount=-CUT_EXTRUDE14_DEPTH, mode=Mode.SUBTRACT)

    # Sketch18 → Cut-Extrude15 (cut)
    with BuildSketch(Plane(origin=(0, -2.171572875, 2.171572875), x_dir=(1, 0, 0), z_dir=(0, -0.7071067811865477, 0.7071067811865475))):
        with Locations(Location((-115, 19.284271247, 0), (0, 0, 270))):
            Circle(SKETCH18_R)
        with Locations(Location((115, 19.284271247, 0), (0, 0, 270))):
            Circle(SKETCH18_R)
    extrude(amount=-CUT_EXTRUDE15_DEPTH, mode=Mode.SUBTRACT)


solid = part.part
